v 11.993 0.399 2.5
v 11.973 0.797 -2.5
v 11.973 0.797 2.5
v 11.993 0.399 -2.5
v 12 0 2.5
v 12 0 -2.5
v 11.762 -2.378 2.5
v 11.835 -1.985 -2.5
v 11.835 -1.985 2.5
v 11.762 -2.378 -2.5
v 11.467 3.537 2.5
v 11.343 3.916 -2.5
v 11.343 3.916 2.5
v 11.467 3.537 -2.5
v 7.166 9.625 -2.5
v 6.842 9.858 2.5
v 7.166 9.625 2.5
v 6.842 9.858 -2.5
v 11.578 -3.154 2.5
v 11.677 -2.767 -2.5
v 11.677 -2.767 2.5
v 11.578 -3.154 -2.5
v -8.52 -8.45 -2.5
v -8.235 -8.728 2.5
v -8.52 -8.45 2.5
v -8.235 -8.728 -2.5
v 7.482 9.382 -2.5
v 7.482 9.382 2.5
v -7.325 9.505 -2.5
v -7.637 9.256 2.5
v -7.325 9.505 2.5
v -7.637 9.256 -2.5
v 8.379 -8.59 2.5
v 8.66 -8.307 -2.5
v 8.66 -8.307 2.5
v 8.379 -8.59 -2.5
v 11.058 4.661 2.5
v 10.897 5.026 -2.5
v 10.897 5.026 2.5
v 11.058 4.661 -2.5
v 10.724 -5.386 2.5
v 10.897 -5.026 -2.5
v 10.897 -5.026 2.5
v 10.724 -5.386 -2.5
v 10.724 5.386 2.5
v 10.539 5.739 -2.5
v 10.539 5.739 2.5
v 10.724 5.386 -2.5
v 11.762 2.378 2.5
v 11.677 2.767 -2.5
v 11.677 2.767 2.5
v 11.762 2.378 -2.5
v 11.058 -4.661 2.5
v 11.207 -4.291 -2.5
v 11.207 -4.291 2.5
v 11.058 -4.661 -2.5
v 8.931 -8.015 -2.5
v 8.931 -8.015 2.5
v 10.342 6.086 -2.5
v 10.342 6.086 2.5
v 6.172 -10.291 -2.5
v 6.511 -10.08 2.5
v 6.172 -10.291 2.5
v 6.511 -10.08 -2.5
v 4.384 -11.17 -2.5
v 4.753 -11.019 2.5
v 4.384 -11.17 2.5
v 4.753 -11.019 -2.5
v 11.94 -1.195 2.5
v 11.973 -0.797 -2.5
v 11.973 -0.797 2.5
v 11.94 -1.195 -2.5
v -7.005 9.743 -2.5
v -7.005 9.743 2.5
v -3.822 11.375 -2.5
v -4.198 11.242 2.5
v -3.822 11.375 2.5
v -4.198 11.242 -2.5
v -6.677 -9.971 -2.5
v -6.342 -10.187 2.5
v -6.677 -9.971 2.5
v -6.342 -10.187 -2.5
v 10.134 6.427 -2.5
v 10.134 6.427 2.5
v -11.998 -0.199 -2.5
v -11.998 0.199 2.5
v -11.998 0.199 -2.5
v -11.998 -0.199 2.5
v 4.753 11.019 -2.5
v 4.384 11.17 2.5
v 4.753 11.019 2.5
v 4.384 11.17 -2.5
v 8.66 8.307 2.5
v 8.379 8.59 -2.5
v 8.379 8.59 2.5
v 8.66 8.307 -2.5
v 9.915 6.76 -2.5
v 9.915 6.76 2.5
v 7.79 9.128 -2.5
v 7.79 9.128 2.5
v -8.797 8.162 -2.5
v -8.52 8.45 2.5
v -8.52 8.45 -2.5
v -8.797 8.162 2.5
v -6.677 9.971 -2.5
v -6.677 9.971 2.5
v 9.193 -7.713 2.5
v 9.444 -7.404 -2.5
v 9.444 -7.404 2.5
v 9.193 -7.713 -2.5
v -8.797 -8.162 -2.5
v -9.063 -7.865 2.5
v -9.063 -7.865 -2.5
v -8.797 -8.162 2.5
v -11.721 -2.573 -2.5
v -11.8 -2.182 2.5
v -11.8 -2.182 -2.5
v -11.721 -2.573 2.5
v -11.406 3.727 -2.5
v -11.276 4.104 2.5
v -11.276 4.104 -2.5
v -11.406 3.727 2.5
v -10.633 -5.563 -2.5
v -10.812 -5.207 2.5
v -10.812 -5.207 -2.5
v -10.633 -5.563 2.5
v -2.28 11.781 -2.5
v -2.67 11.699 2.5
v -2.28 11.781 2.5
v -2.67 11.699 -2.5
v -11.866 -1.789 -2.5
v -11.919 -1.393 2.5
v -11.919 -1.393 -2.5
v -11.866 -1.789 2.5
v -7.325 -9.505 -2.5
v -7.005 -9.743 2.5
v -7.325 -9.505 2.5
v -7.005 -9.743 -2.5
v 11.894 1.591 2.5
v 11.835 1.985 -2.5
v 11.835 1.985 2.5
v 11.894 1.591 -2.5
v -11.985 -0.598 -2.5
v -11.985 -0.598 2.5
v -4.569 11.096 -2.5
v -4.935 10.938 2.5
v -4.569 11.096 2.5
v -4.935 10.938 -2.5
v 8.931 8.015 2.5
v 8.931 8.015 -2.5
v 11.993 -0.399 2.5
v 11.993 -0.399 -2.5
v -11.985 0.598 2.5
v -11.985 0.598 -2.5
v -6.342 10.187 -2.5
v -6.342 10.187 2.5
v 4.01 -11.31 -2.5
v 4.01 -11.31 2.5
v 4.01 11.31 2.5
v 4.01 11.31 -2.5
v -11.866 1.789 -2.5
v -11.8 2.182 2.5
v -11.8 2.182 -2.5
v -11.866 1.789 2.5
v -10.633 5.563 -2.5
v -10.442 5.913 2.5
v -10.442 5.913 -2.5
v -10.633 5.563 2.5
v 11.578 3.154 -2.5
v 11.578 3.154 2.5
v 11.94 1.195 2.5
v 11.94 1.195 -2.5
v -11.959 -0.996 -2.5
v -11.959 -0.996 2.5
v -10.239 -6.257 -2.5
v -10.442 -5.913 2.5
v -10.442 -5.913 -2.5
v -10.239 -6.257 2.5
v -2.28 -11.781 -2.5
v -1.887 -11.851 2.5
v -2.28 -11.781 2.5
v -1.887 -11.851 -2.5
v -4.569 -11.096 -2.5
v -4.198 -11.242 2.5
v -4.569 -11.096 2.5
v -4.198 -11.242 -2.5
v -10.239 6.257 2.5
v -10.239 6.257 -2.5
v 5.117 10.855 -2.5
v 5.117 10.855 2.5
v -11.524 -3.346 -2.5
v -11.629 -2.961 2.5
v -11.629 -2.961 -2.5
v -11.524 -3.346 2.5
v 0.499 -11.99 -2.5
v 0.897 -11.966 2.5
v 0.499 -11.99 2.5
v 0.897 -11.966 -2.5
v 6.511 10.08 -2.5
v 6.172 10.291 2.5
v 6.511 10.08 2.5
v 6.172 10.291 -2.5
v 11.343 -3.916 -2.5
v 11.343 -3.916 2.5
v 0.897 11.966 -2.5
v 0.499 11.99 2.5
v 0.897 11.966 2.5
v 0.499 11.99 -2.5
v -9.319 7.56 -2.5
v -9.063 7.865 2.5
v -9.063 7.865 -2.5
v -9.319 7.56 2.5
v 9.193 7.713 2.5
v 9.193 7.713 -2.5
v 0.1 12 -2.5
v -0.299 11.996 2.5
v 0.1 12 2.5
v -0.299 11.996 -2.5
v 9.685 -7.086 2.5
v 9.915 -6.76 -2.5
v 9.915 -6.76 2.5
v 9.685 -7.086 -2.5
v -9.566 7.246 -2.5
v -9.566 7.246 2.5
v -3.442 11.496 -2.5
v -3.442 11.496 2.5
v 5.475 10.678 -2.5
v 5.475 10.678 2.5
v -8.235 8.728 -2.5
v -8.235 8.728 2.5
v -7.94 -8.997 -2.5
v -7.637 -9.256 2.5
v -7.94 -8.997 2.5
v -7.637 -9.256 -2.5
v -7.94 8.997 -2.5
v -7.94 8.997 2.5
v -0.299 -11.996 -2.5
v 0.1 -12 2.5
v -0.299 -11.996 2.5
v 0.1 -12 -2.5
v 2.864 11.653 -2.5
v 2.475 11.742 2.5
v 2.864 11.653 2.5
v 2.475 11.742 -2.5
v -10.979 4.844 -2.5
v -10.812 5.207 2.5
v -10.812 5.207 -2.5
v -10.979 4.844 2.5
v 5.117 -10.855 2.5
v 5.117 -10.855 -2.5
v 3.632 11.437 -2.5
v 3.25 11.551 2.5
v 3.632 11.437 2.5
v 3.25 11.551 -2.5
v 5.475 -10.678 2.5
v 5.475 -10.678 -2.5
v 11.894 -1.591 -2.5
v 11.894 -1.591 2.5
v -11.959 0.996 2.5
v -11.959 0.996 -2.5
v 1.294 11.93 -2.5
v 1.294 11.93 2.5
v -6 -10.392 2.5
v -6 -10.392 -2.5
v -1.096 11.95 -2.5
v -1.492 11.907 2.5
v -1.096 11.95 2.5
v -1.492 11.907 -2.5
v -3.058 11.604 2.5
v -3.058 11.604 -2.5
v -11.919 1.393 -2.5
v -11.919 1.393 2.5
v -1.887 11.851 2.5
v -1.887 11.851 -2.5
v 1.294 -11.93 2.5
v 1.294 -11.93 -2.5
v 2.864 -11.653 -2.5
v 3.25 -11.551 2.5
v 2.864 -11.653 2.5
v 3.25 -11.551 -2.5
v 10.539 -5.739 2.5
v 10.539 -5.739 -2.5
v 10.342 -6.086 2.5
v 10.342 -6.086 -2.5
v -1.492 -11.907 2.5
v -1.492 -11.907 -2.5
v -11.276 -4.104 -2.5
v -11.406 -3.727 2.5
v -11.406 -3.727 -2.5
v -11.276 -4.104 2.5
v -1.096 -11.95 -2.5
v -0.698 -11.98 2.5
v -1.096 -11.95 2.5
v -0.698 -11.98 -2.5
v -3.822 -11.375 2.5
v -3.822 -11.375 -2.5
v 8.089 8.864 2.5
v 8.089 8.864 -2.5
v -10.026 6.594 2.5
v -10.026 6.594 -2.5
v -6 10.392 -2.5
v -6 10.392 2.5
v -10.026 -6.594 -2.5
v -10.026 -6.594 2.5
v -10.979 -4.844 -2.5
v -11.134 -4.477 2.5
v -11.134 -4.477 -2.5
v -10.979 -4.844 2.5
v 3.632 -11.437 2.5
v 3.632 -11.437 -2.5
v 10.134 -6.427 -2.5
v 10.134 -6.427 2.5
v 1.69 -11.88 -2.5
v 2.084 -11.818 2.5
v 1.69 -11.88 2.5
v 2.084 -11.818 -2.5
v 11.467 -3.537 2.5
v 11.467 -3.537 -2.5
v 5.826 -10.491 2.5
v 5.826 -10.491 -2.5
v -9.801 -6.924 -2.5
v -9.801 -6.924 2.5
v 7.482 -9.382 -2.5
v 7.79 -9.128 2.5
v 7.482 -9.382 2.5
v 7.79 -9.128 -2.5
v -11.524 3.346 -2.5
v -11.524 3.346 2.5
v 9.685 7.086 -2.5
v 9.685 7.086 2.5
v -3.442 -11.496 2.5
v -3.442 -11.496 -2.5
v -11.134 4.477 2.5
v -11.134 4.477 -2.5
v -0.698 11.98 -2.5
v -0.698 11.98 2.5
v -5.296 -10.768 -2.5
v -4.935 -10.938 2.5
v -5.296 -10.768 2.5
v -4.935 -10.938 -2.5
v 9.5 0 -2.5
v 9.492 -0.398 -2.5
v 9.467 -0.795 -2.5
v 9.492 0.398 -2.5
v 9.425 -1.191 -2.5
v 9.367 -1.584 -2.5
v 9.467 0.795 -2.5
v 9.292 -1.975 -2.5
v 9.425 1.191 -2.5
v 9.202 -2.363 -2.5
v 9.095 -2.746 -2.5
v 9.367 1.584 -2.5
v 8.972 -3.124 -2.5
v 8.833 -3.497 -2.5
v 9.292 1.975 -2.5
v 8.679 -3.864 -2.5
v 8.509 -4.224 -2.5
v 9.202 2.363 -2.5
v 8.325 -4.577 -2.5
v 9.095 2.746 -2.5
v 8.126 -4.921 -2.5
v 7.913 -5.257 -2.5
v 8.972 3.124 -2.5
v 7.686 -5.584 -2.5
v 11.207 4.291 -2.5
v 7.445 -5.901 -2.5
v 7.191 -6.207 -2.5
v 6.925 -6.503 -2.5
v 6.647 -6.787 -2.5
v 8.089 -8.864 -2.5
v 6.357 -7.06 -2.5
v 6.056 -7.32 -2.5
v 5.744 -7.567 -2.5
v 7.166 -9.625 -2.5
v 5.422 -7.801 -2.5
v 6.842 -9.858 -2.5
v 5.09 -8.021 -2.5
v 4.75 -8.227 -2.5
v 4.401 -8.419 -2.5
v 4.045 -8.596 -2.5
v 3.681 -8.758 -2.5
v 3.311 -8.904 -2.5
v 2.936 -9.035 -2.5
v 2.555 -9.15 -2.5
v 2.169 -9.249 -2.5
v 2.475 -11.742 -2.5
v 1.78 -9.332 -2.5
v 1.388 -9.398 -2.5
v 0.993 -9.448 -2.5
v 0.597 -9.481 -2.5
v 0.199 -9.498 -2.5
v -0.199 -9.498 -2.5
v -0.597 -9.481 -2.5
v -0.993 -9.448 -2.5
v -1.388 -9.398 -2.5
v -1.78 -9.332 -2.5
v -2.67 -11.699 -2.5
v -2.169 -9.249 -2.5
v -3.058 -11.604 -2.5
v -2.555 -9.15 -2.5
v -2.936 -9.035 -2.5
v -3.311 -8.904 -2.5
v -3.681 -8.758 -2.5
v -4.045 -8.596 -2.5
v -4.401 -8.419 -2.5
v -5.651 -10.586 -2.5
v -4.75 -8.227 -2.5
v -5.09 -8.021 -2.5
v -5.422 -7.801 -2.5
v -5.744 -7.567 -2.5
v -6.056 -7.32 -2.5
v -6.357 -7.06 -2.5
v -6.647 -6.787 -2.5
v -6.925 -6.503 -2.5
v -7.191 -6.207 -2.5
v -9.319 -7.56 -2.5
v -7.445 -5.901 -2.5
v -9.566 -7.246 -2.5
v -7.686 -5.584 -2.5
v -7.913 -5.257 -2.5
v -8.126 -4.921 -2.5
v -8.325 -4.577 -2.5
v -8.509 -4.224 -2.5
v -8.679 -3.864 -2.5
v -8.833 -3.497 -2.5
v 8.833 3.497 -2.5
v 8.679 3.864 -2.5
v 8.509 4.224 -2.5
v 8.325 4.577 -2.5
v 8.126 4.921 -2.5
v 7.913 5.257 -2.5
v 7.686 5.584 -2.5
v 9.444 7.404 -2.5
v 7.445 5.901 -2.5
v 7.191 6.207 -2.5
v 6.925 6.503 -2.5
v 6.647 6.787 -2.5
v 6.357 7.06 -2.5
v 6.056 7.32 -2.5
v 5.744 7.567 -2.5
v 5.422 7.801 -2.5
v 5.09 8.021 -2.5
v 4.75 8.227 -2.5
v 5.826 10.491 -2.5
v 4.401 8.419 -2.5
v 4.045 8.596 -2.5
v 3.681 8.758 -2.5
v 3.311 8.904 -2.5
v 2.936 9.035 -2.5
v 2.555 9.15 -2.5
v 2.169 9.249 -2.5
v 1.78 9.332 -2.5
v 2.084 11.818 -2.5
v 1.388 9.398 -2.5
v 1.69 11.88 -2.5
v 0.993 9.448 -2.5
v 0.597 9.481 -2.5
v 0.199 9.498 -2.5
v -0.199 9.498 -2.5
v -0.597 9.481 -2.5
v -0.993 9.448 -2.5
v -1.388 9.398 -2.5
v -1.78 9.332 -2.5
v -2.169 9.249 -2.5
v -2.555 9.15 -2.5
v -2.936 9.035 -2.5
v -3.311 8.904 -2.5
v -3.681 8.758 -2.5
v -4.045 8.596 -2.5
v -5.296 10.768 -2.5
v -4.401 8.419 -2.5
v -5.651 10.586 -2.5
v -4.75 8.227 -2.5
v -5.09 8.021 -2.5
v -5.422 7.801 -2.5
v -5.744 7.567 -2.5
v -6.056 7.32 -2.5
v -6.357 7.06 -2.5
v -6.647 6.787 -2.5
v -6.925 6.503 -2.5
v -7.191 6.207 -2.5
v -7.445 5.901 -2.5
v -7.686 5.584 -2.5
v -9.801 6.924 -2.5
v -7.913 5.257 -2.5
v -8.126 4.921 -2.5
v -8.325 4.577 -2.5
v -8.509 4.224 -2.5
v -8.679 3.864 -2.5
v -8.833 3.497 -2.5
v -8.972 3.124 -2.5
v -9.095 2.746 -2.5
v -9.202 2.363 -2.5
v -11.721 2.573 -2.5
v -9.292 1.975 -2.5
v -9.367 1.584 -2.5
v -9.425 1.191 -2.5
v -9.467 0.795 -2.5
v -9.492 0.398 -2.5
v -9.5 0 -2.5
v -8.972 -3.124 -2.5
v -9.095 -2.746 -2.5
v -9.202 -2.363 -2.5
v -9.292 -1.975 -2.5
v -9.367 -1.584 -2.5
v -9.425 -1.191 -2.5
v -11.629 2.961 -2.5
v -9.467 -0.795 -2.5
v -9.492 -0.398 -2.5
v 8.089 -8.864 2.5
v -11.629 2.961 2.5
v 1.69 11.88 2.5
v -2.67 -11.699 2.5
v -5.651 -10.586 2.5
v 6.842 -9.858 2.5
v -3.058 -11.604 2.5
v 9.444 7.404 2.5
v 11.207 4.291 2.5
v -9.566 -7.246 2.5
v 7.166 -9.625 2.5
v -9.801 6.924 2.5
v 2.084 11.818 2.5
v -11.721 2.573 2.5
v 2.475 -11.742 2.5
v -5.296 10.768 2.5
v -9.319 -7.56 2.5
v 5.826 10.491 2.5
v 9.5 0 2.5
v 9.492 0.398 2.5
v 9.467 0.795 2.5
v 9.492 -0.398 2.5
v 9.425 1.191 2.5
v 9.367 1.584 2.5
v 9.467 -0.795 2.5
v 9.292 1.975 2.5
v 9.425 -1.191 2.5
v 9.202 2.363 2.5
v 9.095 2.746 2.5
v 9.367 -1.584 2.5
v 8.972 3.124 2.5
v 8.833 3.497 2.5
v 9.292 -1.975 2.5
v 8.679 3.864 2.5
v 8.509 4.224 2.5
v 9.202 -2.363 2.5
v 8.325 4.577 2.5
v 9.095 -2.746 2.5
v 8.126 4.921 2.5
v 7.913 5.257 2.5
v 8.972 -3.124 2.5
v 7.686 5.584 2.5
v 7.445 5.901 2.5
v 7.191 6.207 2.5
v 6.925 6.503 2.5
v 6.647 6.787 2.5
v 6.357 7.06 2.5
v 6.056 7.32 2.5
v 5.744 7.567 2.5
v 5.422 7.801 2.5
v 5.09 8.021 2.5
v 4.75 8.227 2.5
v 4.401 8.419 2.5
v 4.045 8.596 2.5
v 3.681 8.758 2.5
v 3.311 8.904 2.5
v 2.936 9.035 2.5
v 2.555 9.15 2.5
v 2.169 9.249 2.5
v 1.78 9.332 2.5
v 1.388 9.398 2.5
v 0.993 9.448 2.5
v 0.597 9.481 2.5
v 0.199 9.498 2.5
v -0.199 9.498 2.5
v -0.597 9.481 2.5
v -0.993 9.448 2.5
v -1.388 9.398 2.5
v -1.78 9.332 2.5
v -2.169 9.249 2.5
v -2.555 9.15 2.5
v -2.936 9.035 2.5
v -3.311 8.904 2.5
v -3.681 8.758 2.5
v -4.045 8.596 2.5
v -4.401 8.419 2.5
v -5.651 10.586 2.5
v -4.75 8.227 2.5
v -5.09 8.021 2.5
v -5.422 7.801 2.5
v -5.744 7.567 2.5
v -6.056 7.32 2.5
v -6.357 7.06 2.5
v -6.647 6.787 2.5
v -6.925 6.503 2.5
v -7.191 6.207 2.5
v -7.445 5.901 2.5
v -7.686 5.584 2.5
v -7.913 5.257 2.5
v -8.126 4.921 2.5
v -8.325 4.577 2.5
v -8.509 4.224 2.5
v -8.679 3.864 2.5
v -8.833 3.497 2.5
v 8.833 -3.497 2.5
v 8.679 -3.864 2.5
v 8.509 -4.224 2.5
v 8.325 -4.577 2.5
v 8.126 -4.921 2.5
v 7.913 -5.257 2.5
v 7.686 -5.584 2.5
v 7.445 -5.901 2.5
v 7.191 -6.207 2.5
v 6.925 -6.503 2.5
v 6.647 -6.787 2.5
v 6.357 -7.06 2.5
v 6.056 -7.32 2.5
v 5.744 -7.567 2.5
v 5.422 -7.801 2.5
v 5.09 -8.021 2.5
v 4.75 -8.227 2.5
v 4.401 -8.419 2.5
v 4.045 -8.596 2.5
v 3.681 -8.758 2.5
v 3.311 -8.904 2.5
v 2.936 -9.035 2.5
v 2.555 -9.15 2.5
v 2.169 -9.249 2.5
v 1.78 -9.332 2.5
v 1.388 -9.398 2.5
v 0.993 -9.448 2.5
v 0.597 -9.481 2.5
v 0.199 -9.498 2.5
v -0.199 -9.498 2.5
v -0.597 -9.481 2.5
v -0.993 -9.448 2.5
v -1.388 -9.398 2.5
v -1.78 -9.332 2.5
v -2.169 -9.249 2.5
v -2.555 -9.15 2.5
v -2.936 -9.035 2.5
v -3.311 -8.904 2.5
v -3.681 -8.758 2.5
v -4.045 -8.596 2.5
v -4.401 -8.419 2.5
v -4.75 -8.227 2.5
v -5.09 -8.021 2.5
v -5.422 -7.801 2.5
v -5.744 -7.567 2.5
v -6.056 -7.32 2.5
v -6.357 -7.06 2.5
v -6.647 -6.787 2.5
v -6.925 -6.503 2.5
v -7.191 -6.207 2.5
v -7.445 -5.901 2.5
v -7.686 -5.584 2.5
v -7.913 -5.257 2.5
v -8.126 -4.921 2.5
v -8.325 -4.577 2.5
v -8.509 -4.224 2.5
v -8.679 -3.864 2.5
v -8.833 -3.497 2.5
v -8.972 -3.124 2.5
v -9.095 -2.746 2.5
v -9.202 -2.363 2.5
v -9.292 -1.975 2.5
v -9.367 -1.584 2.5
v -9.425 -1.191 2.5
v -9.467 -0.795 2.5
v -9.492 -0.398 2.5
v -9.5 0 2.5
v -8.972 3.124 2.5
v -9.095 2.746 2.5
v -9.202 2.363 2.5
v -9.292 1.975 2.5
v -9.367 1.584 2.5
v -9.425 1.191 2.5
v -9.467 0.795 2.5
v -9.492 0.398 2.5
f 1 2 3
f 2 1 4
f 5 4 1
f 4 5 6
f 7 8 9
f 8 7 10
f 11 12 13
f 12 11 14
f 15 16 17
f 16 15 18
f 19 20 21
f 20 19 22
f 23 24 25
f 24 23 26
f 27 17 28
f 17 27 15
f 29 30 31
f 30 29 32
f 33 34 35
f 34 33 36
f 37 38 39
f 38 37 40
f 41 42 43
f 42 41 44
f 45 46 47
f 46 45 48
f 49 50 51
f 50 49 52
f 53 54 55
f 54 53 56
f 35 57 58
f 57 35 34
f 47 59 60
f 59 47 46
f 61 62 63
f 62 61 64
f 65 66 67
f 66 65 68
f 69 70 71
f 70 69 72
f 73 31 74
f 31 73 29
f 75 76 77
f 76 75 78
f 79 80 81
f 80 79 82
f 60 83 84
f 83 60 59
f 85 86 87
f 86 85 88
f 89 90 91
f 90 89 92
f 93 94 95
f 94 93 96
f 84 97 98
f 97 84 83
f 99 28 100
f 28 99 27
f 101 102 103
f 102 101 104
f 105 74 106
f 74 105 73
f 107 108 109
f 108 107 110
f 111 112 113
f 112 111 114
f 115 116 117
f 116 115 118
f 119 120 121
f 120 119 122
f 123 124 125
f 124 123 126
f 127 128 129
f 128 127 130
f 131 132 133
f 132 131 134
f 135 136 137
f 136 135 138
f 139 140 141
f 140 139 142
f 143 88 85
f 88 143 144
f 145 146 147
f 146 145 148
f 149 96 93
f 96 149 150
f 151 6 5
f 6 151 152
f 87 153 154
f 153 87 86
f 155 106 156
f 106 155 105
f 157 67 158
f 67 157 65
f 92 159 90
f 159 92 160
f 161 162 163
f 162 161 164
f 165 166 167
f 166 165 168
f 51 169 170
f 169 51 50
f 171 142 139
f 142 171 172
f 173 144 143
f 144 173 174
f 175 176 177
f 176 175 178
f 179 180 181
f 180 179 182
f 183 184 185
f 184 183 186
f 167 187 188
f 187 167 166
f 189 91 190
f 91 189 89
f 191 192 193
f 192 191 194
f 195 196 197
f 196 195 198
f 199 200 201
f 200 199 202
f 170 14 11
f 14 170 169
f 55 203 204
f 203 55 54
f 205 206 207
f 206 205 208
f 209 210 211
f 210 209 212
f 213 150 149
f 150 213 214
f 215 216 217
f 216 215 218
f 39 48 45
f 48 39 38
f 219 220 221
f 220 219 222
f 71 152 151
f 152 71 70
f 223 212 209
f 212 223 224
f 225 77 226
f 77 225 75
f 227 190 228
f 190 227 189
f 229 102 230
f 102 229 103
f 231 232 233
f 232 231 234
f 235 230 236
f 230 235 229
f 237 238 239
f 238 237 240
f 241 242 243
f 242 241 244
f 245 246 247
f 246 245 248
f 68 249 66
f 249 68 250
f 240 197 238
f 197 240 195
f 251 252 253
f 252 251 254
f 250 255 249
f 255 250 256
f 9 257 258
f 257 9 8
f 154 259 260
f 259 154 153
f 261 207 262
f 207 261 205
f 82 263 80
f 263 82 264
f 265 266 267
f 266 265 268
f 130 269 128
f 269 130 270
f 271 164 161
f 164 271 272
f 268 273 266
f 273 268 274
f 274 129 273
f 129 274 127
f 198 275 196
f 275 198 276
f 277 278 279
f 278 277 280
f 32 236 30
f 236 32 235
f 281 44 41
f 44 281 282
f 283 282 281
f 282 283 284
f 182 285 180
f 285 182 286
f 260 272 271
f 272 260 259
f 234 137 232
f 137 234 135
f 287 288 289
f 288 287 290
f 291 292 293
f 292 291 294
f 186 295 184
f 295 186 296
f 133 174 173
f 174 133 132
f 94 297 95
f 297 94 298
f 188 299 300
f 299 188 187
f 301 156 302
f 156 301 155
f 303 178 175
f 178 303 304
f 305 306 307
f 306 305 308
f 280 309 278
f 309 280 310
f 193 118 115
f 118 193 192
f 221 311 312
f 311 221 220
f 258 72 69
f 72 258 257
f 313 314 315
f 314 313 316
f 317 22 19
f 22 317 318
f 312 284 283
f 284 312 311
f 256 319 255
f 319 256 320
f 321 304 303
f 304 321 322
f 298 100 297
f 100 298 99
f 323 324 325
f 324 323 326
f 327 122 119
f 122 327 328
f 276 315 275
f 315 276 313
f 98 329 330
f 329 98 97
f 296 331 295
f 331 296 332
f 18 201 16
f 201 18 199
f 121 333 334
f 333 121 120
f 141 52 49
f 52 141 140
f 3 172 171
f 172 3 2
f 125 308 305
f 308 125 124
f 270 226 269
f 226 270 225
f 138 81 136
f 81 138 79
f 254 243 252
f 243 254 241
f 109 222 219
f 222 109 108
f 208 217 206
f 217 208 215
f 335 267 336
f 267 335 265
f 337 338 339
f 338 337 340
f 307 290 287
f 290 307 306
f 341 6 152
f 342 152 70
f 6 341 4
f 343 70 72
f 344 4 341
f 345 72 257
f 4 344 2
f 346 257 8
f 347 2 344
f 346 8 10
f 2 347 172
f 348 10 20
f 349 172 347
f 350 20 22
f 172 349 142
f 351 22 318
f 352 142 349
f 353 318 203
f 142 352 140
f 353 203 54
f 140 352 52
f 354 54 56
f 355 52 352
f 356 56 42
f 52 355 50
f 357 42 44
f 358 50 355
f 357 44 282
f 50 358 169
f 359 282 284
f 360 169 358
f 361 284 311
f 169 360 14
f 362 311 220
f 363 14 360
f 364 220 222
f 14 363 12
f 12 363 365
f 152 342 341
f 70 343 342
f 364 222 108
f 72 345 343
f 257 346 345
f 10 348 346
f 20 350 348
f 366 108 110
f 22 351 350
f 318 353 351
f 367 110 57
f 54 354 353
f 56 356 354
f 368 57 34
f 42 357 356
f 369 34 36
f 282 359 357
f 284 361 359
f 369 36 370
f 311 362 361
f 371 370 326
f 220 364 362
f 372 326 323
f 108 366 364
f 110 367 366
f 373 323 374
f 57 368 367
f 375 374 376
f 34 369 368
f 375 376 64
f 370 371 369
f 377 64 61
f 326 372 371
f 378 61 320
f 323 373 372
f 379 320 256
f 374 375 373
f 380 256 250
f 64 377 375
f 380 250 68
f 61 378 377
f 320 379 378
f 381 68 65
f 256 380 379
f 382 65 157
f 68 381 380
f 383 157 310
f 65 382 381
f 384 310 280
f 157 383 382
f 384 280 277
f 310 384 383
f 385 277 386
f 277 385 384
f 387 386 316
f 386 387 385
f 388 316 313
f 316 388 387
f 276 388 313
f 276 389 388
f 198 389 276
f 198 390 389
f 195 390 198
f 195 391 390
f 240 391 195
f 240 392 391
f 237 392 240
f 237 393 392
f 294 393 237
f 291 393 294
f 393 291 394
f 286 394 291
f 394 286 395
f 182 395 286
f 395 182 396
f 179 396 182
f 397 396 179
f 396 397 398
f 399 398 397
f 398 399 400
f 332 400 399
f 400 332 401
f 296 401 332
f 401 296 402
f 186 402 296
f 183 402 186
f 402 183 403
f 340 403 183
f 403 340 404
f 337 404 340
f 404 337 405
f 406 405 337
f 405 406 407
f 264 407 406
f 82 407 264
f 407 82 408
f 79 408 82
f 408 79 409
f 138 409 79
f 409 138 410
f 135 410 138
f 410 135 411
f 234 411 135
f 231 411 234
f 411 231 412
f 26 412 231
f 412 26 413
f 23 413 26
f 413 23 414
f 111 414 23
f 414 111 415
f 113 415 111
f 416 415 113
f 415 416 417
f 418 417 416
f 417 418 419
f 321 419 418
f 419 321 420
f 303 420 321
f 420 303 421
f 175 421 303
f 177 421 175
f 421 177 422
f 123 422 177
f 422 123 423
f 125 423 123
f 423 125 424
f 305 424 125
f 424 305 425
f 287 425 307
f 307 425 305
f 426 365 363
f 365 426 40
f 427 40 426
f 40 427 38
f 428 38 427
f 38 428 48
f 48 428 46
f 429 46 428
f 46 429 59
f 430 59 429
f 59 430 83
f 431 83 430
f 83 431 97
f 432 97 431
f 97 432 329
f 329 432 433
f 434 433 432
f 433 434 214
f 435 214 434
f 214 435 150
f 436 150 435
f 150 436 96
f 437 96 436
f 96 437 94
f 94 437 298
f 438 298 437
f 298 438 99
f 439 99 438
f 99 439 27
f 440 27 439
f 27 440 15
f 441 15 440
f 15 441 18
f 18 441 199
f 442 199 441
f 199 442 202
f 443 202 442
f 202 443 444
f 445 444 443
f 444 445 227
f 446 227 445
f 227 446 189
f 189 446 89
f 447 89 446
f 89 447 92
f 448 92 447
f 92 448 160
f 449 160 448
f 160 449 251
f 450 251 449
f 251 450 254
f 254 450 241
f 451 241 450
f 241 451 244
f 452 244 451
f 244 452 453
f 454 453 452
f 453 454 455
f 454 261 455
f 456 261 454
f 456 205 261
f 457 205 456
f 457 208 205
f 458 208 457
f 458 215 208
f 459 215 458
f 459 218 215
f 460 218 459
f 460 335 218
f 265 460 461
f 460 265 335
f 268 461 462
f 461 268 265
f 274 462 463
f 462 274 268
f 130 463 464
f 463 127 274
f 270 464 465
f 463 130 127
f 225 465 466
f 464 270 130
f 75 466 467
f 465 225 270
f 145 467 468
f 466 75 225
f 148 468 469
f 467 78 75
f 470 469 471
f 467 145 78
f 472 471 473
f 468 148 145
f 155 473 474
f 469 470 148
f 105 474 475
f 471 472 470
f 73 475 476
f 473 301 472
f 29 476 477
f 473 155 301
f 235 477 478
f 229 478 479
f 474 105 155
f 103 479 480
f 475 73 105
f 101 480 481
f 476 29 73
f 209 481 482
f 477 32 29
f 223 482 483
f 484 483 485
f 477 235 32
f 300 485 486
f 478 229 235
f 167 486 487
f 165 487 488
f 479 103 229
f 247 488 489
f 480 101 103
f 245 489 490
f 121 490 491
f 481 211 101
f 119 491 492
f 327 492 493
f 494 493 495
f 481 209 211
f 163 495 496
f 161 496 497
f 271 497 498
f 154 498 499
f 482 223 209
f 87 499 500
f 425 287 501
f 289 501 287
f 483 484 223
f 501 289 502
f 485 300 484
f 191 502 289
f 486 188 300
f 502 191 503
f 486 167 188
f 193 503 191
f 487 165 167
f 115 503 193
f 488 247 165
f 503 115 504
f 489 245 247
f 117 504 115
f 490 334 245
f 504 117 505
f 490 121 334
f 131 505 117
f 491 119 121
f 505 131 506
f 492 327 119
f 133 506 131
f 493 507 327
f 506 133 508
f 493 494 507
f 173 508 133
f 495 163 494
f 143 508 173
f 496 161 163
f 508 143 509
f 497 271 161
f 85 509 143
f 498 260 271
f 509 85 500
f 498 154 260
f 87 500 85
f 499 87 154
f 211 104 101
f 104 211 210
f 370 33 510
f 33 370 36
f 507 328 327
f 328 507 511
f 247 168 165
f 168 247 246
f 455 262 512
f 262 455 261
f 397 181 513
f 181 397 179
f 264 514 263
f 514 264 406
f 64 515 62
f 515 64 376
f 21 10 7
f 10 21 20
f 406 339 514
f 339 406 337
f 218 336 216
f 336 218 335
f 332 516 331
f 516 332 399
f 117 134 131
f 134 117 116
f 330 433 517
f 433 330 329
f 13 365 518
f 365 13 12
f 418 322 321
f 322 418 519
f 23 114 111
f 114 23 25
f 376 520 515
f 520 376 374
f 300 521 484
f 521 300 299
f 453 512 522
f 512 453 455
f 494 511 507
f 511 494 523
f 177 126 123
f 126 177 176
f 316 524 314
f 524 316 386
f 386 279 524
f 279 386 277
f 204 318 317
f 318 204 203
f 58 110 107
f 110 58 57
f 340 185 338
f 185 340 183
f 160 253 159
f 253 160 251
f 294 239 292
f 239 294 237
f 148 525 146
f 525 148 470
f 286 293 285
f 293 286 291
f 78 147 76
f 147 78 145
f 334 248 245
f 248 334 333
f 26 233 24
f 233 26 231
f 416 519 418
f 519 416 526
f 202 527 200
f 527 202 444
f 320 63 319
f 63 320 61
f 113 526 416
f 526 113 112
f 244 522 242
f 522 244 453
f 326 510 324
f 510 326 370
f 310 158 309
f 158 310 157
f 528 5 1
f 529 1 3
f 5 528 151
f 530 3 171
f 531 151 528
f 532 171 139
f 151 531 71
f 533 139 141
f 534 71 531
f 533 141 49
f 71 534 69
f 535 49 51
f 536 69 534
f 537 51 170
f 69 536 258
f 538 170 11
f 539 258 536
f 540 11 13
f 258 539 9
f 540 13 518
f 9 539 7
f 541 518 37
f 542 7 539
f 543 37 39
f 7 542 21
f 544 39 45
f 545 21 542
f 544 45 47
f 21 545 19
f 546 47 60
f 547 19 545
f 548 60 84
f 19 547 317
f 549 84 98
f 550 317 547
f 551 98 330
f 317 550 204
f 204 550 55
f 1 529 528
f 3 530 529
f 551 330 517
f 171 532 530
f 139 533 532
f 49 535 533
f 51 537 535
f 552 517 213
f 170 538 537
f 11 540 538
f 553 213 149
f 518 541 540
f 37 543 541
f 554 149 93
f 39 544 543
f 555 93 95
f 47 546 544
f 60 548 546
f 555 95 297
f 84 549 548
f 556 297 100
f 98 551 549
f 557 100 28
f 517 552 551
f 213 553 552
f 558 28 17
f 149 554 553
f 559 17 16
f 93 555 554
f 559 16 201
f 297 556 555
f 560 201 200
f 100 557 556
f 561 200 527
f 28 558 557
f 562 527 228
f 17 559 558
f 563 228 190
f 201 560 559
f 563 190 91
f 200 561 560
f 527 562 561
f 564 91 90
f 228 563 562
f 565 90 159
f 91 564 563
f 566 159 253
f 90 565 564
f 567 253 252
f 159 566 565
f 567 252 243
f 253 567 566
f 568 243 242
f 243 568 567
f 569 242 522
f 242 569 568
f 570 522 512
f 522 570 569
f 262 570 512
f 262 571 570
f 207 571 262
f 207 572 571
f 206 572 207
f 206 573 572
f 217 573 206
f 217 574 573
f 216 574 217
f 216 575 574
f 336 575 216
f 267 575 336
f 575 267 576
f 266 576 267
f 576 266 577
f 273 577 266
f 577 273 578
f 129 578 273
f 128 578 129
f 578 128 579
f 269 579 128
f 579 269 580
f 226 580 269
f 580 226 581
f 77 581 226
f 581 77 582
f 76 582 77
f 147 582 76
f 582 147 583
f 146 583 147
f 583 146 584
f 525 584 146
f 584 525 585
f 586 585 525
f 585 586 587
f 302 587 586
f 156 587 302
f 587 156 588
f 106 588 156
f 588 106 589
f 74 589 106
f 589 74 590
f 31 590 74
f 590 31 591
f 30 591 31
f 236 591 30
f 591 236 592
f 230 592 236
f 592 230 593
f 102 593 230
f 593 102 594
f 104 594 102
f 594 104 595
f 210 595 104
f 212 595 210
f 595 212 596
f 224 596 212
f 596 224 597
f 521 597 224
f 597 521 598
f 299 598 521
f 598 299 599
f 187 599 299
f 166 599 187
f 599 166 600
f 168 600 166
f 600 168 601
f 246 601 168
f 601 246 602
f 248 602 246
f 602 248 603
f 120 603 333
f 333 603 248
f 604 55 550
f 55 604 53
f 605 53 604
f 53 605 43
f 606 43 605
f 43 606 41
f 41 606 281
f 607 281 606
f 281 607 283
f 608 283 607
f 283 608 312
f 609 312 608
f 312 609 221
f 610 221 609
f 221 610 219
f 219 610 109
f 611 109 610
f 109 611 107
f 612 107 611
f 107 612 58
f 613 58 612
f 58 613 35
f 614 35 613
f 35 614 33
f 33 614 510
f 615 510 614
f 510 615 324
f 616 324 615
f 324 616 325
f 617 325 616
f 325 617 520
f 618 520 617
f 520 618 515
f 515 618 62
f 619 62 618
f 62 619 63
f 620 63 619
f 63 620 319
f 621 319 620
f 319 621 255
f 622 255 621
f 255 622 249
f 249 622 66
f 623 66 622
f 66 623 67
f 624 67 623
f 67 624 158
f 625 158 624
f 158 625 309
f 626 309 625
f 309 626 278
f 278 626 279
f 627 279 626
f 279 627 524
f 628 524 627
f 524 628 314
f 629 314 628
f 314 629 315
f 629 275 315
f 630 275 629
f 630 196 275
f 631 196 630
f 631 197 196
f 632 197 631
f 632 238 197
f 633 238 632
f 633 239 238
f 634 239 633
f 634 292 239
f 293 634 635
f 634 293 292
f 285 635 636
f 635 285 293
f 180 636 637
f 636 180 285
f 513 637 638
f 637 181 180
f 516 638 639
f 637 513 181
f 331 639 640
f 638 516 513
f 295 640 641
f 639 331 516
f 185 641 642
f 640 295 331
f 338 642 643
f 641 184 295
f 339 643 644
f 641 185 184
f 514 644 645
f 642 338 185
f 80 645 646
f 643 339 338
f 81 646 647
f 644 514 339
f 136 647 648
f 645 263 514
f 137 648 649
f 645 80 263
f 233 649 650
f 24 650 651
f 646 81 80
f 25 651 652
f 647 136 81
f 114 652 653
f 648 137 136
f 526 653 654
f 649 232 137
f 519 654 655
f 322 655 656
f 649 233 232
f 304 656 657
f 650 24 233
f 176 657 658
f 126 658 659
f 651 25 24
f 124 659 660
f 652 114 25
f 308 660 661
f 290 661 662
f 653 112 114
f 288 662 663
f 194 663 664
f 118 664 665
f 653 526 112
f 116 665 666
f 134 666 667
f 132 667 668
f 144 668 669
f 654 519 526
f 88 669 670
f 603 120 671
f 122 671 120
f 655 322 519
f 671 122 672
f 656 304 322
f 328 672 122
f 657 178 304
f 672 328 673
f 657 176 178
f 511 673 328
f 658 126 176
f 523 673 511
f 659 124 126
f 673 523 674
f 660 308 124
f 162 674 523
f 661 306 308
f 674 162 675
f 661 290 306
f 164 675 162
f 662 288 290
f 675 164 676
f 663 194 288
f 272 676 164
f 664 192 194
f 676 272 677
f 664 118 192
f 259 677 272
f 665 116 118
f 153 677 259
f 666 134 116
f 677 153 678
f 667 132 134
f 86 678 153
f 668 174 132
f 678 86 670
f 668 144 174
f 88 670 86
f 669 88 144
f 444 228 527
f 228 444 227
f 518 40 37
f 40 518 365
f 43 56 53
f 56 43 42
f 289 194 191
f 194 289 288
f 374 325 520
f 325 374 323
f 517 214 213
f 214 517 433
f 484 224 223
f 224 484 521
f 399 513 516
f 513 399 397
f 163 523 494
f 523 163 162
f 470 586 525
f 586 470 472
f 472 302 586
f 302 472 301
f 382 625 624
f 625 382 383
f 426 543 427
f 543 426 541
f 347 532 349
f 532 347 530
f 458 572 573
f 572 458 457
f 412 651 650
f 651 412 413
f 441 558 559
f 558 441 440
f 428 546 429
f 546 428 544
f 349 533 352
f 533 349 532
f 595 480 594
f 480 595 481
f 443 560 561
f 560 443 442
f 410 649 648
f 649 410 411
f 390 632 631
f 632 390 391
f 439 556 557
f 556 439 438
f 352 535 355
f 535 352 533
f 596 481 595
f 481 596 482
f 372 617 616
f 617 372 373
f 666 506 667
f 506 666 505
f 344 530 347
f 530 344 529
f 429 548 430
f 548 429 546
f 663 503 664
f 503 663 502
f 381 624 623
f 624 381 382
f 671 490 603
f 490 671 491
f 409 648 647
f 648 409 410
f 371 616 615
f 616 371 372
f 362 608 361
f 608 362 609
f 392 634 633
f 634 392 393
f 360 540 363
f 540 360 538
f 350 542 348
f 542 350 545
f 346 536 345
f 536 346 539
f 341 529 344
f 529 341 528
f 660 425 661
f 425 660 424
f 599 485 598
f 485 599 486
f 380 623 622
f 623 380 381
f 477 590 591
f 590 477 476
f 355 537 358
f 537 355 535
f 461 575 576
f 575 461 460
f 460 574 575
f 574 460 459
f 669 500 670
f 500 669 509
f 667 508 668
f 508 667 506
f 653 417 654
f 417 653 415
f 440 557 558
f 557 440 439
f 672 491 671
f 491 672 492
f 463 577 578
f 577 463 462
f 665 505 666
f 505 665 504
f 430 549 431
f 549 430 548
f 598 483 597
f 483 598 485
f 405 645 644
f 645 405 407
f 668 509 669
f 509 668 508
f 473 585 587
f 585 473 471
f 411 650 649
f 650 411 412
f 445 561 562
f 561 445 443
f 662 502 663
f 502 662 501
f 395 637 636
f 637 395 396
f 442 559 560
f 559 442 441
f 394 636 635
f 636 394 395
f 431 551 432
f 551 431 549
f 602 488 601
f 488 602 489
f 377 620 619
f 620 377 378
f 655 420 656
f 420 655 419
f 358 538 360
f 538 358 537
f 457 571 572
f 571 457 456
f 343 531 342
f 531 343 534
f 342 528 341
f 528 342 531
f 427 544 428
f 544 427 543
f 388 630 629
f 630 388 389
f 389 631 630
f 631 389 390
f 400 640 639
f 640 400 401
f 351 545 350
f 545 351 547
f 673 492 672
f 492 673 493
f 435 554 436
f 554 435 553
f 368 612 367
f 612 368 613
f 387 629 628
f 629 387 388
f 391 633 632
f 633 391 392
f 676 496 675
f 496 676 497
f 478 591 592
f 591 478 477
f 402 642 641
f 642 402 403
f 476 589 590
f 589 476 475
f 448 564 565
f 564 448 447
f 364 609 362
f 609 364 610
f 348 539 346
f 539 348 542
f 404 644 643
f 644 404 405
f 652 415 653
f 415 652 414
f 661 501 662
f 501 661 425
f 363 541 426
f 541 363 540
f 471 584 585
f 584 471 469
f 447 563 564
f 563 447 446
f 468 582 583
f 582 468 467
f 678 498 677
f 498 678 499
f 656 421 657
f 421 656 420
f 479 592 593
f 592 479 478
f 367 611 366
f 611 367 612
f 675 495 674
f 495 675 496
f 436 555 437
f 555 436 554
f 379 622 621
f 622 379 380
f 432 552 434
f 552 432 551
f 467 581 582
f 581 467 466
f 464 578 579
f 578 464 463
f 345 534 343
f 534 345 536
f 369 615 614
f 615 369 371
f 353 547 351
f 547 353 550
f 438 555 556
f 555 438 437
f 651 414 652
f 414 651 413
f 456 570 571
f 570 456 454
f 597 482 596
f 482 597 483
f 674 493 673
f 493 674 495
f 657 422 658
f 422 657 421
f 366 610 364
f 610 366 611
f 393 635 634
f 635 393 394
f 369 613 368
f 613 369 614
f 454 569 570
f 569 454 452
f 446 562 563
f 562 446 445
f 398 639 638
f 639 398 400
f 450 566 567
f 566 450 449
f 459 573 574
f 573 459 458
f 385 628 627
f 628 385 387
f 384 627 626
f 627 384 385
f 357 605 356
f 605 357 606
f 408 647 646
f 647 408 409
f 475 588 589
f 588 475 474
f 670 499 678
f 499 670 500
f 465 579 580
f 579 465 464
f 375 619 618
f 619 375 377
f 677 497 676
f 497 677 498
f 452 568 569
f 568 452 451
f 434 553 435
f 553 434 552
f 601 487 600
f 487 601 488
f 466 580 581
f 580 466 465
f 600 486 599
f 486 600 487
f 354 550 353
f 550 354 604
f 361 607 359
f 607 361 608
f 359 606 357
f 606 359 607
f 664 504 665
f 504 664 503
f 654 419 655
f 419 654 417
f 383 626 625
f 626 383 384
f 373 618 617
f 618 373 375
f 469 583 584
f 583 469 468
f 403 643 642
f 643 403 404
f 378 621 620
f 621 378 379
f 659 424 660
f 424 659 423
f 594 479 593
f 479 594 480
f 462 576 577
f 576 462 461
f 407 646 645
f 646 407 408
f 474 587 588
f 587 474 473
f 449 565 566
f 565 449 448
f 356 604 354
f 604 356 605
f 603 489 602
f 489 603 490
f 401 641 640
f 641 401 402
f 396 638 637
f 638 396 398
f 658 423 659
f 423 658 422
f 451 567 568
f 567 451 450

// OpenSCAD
$fa=1;
$fs=0.4;

module spoked_wheel(radius = 12, width = 5, thickness = 5, number_of_spokes = 7, spoke_radius = 1.5) {
    inner_radius = radius - thickness / 2;
    difference() {
        cylinder(width, radius, radius, center=true);
        cylinder(width + 1, inner_radius, inner_radius, center=true);
    }
}

spoked_wheel();
